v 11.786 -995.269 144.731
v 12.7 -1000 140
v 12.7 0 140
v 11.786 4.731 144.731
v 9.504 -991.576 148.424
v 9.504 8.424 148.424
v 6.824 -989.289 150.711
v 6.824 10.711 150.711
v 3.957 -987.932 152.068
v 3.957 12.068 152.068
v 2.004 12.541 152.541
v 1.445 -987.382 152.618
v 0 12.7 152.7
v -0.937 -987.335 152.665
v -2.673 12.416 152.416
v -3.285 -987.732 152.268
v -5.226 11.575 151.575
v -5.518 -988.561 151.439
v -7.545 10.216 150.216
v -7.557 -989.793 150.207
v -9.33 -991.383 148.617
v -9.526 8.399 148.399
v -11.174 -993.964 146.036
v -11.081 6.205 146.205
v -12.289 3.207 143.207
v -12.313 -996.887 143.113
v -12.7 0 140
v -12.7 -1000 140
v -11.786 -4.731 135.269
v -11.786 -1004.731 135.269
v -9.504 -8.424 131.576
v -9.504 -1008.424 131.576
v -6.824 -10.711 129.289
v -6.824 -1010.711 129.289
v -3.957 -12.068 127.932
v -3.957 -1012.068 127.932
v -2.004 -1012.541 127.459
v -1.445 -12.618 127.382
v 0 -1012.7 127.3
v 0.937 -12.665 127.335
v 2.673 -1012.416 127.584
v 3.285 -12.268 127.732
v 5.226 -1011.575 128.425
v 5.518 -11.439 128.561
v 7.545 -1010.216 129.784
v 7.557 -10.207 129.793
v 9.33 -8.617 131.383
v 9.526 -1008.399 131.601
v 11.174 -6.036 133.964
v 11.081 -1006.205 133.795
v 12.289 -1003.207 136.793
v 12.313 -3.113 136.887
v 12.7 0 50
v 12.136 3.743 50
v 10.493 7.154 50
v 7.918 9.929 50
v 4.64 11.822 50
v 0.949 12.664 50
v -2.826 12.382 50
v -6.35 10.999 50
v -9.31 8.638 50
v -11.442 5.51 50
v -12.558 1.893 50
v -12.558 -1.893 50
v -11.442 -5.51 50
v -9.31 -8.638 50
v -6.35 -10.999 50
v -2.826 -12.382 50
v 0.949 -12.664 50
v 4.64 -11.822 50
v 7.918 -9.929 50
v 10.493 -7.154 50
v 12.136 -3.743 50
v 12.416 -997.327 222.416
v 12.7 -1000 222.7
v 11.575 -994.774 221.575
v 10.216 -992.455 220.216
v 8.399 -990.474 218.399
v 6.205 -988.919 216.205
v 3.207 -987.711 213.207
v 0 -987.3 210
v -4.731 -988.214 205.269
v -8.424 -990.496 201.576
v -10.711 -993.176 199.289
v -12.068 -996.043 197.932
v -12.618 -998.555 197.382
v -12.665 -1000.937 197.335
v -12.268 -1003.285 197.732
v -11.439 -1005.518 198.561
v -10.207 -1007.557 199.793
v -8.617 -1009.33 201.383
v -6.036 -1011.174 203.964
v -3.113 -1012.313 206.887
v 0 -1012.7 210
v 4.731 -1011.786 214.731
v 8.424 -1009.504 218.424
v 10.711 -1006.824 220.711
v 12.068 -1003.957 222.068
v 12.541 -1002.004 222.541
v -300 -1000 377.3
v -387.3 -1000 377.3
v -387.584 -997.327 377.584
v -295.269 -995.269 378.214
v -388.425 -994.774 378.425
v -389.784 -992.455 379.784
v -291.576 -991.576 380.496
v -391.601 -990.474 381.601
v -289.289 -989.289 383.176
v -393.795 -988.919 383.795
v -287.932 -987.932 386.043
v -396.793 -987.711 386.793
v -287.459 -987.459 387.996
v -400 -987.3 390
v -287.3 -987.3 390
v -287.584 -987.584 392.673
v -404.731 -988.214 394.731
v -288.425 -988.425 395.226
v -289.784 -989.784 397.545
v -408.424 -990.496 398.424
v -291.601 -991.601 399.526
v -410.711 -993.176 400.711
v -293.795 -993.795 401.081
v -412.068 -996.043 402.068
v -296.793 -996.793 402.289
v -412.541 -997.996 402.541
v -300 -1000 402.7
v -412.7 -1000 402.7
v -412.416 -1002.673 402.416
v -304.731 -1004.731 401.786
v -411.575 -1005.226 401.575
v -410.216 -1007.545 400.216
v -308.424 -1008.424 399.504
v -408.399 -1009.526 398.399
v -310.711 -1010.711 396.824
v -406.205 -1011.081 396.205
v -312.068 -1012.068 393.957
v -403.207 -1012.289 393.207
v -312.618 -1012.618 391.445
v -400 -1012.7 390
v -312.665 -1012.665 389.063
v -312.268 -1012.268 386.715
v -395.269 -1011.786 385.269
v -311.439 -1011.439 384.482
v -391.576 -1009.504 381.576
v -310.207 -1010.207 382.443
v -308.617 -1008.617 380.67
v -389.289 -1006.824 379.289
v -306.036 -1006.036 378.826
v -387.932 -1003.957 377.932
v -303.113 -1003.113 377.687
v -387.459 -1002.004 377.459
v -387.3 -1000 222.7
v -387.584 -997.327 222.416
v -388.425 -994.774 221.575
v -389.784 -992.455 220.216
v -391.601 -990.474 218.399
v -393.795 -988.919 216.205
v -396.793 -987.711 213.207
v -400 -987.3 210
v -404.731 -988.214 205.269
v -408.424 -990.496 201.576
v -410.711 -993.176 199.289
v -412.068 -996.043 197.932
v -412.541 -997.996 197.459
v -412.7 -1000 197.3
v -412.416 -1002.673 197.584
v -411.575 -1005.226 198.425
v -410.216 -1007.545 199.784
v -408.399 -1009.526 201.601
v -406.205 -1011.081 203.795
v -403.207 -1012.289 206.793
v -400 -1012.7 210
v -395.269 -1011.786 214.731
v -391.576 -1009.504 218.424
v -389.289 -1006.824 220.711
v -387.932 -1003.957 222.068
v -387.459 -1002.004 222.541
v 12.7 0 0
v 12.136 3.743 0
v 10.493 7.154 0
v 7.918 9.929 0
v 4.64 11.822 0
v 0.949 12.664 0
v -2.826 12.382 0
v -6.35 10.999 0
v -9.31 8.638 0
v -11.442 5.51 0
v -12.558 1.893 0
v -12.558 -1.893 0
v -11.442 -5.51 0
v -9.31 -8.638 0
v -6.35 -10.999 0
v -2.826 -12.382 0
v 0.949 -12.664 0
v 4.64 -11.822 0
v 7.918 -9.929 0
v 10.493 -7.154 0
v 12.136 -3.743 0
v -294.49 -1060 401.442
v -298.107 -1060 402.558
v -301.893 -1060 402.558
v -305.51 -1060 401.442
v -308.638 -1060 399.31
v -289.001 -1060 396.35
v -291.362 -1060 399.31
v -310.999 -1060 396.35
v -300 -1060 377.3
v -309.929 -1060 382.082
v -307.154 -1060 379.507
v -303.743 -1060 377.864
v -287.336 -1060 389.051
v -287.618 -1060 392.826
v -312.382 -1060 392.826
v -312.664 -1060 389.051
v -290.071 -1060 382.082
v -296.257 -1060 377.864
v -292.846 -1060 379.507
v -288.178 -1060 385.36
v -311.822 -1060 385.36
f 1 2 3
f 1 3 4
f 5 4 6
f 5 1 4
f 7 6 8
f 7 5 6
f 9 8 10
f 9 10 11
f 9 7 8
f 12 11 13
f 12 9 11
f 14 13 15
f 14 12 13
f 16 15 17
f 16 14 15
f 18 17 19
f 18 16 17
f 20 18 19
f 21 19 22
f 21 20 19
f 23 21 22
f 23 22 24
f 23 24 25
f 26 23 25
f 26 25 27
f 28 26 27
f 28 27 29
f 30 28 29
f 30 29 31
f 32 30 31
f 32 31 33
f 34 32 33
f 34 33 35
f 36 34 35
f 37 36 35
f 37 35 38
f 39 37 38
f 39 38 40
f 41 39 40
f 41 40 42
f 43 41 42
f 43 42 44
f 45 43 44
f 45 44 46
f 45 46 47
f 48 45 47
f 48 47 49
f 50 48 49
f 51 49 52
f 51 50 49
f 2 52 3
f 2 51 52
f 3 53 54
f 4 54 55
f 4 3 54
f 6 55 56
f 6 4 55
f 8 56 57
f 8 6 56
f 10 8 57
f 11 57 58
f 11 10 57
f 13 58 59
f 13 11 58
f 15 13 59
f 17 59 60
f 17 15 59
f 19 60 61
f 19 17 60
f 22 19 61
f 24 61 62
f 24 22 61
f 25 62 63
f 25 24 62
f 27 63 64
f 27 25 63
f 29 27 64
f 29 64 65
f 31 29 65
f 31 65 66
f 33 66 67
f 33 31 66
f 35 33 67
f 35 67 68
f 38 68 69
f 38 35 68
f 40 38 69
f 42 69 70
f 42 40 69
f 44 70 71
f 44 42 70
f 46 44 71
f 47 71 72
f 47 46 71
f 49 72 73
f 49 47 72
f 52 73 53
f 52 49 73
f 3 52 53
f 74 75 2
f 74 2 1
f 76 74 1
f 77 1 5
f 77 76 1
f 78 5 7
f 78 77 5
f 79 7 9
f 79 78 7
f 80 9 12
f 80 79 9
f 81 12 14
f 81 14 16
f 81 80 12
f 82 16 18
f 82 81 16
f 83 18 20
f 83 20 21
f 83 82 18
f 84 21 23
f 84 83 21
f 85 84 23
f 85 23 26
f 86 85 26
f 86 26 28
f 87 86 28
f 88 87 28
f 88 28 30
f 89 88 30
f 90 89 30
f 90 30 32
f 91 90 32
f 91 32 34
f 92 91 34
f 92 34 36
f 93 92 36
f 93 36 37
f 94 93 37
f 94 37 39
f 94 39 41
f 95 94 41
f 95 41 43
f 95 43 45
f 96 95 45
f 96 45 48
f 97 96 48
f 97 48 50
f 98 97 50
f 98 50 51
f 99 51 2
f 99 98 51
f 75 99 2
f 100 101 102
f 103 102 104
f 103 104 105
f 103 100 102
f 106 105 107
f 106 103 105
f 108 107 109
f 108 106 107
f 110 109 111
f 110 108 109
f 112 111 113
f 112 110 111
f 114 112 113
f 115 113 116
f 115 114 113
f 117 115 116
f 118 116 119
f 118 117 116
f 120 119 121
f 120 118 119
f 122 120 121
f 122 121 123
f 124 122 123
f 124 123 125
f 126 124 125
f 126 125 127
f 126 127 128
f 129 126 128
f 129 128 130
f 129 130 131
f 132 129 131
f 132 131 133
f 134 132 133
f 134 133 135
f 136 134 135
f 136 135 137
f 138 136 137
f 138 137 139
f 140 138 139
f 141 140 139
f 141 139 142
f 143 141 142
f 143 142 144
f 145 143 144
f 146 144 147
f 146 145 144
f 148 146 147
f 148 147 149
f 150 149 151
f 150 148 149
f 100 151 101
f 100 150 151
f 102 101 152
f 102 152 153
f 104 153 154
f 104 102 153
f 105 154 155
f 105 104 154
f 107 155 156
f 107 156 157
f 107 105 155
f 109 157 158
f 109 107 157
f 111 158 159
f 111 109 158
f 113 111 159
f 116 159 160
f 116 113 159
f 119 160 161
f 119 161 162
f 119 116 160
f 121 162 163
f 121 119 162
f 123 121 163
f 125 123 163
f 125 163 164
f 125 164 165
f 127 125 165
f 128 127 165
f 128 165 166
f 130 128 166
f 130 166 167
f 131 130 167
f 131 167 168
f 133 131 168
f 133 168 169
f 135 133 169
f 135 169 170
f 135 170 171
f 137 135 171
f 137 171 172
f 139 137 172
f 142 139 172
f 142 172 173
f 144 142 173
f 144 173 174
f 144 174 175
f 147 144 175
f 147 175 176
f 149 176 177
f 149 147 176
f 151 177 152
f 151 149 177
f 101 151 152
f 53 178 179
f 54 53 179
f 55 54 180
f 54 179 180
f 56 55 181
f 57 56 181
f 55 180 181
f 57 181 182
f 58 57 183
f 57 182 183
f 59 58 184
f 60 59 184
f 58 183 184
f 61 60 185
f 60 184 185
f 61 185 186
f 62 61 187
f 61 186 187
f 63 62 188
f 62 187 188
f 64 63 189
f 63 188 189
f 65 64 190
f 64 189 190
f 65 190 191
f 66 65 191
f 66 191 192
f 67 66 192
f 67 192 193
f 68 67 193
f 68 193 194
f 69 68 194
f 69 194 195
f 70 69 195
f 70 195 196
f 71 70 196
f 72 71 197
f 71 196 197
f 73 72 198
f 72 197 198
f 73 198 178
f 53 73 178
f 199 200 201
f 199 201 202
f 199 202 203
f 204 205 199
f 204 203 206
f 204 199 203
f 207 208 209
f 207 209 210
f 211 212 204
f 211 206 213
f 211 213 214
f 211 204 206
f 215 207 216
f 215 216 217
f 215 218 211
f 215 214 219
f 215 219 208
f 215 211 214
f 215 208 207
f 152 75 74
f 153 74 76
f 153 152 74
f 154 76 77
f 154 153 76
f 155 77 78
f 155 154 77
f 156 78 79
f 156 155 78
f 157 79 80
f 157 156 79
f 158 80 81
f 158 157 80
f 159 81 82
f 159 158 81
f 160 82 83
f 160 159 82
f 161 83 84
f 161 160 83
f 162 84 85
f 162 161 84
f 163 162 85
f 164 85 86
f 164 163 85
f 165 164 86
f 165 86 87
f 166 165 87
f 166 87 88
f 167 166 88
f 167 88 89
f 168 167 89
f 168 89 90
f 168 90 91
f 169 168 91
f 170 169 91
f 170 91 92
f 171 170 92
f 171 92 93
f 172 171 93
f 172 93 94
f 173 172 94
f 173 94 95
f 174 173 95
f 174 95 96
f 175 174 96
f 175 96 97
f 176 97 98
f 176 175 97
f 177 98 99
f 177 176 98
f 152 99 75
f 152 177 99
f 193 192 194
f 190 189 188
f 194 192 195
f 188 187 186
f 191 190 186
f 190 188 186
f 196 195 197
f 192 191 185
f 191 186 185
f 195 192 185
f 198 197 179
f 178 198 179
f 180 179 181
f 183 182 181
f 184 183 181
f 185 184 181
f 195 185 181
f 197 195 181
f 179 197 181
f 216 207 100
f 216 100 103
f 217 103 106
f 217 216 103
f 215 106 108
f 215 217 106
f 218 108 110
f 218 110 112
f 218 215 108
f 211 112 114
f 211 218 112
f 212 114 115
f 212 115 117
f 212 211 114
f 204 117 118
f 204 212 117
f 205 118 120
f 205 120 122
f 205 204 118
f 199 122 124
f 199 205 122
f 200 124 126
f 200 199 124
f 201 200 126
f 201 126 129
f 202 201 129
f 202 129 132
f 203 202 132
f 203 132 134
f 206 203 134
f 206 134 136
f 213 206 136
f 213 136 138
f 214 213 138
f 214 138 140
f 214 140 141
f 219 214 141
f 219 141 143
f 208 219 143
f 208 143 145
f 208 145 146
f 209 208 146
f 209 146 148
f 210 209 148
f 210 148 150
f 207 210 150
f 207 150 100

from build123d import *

# Parameters (mm, degrees)
CROQUIS1_R              = 12.7
SALIENTE_EXTRUIR1_DEPTH = 50
CROQUIS2_R              = 12.7


with BuildPart() as part:
    # Croquis1 → Saliente-Extruir1 (new body)
    with BuildSketch(Plane.XY):
        Circle(CROQUIS1_R)
    extrude(amount=SALIENTE_EXTRUIR1_DEPTH)

    # Barrer1: sweep along a curve in space
    with BuildLine() as barrer1_path:
        Line((0, 0, 50), (0, 0, 140))
        Line((0, 0, 140), (0, -1000, 140))
        Line((0, -1000, 140), (0, -1000, 210))
        Line((0, -1000, 210), (-400, -1000, 210))
        Line((-400, -1000, 210), (-400, -1000, 390))
        Line((-400, -1000, 390), (-300, -1000, 390))
        Line((-300, -1000, 390), (-300, -1060, 390))
    # Croquis2 → Barrer1 (sweep)
    with BuildSketch(Plane.XY.offset(50)):
        Circle(CROQUIS2_R)
    sweep(path=barrer1_path.line, transition=Transition.RIGHT)


solid = part.part
